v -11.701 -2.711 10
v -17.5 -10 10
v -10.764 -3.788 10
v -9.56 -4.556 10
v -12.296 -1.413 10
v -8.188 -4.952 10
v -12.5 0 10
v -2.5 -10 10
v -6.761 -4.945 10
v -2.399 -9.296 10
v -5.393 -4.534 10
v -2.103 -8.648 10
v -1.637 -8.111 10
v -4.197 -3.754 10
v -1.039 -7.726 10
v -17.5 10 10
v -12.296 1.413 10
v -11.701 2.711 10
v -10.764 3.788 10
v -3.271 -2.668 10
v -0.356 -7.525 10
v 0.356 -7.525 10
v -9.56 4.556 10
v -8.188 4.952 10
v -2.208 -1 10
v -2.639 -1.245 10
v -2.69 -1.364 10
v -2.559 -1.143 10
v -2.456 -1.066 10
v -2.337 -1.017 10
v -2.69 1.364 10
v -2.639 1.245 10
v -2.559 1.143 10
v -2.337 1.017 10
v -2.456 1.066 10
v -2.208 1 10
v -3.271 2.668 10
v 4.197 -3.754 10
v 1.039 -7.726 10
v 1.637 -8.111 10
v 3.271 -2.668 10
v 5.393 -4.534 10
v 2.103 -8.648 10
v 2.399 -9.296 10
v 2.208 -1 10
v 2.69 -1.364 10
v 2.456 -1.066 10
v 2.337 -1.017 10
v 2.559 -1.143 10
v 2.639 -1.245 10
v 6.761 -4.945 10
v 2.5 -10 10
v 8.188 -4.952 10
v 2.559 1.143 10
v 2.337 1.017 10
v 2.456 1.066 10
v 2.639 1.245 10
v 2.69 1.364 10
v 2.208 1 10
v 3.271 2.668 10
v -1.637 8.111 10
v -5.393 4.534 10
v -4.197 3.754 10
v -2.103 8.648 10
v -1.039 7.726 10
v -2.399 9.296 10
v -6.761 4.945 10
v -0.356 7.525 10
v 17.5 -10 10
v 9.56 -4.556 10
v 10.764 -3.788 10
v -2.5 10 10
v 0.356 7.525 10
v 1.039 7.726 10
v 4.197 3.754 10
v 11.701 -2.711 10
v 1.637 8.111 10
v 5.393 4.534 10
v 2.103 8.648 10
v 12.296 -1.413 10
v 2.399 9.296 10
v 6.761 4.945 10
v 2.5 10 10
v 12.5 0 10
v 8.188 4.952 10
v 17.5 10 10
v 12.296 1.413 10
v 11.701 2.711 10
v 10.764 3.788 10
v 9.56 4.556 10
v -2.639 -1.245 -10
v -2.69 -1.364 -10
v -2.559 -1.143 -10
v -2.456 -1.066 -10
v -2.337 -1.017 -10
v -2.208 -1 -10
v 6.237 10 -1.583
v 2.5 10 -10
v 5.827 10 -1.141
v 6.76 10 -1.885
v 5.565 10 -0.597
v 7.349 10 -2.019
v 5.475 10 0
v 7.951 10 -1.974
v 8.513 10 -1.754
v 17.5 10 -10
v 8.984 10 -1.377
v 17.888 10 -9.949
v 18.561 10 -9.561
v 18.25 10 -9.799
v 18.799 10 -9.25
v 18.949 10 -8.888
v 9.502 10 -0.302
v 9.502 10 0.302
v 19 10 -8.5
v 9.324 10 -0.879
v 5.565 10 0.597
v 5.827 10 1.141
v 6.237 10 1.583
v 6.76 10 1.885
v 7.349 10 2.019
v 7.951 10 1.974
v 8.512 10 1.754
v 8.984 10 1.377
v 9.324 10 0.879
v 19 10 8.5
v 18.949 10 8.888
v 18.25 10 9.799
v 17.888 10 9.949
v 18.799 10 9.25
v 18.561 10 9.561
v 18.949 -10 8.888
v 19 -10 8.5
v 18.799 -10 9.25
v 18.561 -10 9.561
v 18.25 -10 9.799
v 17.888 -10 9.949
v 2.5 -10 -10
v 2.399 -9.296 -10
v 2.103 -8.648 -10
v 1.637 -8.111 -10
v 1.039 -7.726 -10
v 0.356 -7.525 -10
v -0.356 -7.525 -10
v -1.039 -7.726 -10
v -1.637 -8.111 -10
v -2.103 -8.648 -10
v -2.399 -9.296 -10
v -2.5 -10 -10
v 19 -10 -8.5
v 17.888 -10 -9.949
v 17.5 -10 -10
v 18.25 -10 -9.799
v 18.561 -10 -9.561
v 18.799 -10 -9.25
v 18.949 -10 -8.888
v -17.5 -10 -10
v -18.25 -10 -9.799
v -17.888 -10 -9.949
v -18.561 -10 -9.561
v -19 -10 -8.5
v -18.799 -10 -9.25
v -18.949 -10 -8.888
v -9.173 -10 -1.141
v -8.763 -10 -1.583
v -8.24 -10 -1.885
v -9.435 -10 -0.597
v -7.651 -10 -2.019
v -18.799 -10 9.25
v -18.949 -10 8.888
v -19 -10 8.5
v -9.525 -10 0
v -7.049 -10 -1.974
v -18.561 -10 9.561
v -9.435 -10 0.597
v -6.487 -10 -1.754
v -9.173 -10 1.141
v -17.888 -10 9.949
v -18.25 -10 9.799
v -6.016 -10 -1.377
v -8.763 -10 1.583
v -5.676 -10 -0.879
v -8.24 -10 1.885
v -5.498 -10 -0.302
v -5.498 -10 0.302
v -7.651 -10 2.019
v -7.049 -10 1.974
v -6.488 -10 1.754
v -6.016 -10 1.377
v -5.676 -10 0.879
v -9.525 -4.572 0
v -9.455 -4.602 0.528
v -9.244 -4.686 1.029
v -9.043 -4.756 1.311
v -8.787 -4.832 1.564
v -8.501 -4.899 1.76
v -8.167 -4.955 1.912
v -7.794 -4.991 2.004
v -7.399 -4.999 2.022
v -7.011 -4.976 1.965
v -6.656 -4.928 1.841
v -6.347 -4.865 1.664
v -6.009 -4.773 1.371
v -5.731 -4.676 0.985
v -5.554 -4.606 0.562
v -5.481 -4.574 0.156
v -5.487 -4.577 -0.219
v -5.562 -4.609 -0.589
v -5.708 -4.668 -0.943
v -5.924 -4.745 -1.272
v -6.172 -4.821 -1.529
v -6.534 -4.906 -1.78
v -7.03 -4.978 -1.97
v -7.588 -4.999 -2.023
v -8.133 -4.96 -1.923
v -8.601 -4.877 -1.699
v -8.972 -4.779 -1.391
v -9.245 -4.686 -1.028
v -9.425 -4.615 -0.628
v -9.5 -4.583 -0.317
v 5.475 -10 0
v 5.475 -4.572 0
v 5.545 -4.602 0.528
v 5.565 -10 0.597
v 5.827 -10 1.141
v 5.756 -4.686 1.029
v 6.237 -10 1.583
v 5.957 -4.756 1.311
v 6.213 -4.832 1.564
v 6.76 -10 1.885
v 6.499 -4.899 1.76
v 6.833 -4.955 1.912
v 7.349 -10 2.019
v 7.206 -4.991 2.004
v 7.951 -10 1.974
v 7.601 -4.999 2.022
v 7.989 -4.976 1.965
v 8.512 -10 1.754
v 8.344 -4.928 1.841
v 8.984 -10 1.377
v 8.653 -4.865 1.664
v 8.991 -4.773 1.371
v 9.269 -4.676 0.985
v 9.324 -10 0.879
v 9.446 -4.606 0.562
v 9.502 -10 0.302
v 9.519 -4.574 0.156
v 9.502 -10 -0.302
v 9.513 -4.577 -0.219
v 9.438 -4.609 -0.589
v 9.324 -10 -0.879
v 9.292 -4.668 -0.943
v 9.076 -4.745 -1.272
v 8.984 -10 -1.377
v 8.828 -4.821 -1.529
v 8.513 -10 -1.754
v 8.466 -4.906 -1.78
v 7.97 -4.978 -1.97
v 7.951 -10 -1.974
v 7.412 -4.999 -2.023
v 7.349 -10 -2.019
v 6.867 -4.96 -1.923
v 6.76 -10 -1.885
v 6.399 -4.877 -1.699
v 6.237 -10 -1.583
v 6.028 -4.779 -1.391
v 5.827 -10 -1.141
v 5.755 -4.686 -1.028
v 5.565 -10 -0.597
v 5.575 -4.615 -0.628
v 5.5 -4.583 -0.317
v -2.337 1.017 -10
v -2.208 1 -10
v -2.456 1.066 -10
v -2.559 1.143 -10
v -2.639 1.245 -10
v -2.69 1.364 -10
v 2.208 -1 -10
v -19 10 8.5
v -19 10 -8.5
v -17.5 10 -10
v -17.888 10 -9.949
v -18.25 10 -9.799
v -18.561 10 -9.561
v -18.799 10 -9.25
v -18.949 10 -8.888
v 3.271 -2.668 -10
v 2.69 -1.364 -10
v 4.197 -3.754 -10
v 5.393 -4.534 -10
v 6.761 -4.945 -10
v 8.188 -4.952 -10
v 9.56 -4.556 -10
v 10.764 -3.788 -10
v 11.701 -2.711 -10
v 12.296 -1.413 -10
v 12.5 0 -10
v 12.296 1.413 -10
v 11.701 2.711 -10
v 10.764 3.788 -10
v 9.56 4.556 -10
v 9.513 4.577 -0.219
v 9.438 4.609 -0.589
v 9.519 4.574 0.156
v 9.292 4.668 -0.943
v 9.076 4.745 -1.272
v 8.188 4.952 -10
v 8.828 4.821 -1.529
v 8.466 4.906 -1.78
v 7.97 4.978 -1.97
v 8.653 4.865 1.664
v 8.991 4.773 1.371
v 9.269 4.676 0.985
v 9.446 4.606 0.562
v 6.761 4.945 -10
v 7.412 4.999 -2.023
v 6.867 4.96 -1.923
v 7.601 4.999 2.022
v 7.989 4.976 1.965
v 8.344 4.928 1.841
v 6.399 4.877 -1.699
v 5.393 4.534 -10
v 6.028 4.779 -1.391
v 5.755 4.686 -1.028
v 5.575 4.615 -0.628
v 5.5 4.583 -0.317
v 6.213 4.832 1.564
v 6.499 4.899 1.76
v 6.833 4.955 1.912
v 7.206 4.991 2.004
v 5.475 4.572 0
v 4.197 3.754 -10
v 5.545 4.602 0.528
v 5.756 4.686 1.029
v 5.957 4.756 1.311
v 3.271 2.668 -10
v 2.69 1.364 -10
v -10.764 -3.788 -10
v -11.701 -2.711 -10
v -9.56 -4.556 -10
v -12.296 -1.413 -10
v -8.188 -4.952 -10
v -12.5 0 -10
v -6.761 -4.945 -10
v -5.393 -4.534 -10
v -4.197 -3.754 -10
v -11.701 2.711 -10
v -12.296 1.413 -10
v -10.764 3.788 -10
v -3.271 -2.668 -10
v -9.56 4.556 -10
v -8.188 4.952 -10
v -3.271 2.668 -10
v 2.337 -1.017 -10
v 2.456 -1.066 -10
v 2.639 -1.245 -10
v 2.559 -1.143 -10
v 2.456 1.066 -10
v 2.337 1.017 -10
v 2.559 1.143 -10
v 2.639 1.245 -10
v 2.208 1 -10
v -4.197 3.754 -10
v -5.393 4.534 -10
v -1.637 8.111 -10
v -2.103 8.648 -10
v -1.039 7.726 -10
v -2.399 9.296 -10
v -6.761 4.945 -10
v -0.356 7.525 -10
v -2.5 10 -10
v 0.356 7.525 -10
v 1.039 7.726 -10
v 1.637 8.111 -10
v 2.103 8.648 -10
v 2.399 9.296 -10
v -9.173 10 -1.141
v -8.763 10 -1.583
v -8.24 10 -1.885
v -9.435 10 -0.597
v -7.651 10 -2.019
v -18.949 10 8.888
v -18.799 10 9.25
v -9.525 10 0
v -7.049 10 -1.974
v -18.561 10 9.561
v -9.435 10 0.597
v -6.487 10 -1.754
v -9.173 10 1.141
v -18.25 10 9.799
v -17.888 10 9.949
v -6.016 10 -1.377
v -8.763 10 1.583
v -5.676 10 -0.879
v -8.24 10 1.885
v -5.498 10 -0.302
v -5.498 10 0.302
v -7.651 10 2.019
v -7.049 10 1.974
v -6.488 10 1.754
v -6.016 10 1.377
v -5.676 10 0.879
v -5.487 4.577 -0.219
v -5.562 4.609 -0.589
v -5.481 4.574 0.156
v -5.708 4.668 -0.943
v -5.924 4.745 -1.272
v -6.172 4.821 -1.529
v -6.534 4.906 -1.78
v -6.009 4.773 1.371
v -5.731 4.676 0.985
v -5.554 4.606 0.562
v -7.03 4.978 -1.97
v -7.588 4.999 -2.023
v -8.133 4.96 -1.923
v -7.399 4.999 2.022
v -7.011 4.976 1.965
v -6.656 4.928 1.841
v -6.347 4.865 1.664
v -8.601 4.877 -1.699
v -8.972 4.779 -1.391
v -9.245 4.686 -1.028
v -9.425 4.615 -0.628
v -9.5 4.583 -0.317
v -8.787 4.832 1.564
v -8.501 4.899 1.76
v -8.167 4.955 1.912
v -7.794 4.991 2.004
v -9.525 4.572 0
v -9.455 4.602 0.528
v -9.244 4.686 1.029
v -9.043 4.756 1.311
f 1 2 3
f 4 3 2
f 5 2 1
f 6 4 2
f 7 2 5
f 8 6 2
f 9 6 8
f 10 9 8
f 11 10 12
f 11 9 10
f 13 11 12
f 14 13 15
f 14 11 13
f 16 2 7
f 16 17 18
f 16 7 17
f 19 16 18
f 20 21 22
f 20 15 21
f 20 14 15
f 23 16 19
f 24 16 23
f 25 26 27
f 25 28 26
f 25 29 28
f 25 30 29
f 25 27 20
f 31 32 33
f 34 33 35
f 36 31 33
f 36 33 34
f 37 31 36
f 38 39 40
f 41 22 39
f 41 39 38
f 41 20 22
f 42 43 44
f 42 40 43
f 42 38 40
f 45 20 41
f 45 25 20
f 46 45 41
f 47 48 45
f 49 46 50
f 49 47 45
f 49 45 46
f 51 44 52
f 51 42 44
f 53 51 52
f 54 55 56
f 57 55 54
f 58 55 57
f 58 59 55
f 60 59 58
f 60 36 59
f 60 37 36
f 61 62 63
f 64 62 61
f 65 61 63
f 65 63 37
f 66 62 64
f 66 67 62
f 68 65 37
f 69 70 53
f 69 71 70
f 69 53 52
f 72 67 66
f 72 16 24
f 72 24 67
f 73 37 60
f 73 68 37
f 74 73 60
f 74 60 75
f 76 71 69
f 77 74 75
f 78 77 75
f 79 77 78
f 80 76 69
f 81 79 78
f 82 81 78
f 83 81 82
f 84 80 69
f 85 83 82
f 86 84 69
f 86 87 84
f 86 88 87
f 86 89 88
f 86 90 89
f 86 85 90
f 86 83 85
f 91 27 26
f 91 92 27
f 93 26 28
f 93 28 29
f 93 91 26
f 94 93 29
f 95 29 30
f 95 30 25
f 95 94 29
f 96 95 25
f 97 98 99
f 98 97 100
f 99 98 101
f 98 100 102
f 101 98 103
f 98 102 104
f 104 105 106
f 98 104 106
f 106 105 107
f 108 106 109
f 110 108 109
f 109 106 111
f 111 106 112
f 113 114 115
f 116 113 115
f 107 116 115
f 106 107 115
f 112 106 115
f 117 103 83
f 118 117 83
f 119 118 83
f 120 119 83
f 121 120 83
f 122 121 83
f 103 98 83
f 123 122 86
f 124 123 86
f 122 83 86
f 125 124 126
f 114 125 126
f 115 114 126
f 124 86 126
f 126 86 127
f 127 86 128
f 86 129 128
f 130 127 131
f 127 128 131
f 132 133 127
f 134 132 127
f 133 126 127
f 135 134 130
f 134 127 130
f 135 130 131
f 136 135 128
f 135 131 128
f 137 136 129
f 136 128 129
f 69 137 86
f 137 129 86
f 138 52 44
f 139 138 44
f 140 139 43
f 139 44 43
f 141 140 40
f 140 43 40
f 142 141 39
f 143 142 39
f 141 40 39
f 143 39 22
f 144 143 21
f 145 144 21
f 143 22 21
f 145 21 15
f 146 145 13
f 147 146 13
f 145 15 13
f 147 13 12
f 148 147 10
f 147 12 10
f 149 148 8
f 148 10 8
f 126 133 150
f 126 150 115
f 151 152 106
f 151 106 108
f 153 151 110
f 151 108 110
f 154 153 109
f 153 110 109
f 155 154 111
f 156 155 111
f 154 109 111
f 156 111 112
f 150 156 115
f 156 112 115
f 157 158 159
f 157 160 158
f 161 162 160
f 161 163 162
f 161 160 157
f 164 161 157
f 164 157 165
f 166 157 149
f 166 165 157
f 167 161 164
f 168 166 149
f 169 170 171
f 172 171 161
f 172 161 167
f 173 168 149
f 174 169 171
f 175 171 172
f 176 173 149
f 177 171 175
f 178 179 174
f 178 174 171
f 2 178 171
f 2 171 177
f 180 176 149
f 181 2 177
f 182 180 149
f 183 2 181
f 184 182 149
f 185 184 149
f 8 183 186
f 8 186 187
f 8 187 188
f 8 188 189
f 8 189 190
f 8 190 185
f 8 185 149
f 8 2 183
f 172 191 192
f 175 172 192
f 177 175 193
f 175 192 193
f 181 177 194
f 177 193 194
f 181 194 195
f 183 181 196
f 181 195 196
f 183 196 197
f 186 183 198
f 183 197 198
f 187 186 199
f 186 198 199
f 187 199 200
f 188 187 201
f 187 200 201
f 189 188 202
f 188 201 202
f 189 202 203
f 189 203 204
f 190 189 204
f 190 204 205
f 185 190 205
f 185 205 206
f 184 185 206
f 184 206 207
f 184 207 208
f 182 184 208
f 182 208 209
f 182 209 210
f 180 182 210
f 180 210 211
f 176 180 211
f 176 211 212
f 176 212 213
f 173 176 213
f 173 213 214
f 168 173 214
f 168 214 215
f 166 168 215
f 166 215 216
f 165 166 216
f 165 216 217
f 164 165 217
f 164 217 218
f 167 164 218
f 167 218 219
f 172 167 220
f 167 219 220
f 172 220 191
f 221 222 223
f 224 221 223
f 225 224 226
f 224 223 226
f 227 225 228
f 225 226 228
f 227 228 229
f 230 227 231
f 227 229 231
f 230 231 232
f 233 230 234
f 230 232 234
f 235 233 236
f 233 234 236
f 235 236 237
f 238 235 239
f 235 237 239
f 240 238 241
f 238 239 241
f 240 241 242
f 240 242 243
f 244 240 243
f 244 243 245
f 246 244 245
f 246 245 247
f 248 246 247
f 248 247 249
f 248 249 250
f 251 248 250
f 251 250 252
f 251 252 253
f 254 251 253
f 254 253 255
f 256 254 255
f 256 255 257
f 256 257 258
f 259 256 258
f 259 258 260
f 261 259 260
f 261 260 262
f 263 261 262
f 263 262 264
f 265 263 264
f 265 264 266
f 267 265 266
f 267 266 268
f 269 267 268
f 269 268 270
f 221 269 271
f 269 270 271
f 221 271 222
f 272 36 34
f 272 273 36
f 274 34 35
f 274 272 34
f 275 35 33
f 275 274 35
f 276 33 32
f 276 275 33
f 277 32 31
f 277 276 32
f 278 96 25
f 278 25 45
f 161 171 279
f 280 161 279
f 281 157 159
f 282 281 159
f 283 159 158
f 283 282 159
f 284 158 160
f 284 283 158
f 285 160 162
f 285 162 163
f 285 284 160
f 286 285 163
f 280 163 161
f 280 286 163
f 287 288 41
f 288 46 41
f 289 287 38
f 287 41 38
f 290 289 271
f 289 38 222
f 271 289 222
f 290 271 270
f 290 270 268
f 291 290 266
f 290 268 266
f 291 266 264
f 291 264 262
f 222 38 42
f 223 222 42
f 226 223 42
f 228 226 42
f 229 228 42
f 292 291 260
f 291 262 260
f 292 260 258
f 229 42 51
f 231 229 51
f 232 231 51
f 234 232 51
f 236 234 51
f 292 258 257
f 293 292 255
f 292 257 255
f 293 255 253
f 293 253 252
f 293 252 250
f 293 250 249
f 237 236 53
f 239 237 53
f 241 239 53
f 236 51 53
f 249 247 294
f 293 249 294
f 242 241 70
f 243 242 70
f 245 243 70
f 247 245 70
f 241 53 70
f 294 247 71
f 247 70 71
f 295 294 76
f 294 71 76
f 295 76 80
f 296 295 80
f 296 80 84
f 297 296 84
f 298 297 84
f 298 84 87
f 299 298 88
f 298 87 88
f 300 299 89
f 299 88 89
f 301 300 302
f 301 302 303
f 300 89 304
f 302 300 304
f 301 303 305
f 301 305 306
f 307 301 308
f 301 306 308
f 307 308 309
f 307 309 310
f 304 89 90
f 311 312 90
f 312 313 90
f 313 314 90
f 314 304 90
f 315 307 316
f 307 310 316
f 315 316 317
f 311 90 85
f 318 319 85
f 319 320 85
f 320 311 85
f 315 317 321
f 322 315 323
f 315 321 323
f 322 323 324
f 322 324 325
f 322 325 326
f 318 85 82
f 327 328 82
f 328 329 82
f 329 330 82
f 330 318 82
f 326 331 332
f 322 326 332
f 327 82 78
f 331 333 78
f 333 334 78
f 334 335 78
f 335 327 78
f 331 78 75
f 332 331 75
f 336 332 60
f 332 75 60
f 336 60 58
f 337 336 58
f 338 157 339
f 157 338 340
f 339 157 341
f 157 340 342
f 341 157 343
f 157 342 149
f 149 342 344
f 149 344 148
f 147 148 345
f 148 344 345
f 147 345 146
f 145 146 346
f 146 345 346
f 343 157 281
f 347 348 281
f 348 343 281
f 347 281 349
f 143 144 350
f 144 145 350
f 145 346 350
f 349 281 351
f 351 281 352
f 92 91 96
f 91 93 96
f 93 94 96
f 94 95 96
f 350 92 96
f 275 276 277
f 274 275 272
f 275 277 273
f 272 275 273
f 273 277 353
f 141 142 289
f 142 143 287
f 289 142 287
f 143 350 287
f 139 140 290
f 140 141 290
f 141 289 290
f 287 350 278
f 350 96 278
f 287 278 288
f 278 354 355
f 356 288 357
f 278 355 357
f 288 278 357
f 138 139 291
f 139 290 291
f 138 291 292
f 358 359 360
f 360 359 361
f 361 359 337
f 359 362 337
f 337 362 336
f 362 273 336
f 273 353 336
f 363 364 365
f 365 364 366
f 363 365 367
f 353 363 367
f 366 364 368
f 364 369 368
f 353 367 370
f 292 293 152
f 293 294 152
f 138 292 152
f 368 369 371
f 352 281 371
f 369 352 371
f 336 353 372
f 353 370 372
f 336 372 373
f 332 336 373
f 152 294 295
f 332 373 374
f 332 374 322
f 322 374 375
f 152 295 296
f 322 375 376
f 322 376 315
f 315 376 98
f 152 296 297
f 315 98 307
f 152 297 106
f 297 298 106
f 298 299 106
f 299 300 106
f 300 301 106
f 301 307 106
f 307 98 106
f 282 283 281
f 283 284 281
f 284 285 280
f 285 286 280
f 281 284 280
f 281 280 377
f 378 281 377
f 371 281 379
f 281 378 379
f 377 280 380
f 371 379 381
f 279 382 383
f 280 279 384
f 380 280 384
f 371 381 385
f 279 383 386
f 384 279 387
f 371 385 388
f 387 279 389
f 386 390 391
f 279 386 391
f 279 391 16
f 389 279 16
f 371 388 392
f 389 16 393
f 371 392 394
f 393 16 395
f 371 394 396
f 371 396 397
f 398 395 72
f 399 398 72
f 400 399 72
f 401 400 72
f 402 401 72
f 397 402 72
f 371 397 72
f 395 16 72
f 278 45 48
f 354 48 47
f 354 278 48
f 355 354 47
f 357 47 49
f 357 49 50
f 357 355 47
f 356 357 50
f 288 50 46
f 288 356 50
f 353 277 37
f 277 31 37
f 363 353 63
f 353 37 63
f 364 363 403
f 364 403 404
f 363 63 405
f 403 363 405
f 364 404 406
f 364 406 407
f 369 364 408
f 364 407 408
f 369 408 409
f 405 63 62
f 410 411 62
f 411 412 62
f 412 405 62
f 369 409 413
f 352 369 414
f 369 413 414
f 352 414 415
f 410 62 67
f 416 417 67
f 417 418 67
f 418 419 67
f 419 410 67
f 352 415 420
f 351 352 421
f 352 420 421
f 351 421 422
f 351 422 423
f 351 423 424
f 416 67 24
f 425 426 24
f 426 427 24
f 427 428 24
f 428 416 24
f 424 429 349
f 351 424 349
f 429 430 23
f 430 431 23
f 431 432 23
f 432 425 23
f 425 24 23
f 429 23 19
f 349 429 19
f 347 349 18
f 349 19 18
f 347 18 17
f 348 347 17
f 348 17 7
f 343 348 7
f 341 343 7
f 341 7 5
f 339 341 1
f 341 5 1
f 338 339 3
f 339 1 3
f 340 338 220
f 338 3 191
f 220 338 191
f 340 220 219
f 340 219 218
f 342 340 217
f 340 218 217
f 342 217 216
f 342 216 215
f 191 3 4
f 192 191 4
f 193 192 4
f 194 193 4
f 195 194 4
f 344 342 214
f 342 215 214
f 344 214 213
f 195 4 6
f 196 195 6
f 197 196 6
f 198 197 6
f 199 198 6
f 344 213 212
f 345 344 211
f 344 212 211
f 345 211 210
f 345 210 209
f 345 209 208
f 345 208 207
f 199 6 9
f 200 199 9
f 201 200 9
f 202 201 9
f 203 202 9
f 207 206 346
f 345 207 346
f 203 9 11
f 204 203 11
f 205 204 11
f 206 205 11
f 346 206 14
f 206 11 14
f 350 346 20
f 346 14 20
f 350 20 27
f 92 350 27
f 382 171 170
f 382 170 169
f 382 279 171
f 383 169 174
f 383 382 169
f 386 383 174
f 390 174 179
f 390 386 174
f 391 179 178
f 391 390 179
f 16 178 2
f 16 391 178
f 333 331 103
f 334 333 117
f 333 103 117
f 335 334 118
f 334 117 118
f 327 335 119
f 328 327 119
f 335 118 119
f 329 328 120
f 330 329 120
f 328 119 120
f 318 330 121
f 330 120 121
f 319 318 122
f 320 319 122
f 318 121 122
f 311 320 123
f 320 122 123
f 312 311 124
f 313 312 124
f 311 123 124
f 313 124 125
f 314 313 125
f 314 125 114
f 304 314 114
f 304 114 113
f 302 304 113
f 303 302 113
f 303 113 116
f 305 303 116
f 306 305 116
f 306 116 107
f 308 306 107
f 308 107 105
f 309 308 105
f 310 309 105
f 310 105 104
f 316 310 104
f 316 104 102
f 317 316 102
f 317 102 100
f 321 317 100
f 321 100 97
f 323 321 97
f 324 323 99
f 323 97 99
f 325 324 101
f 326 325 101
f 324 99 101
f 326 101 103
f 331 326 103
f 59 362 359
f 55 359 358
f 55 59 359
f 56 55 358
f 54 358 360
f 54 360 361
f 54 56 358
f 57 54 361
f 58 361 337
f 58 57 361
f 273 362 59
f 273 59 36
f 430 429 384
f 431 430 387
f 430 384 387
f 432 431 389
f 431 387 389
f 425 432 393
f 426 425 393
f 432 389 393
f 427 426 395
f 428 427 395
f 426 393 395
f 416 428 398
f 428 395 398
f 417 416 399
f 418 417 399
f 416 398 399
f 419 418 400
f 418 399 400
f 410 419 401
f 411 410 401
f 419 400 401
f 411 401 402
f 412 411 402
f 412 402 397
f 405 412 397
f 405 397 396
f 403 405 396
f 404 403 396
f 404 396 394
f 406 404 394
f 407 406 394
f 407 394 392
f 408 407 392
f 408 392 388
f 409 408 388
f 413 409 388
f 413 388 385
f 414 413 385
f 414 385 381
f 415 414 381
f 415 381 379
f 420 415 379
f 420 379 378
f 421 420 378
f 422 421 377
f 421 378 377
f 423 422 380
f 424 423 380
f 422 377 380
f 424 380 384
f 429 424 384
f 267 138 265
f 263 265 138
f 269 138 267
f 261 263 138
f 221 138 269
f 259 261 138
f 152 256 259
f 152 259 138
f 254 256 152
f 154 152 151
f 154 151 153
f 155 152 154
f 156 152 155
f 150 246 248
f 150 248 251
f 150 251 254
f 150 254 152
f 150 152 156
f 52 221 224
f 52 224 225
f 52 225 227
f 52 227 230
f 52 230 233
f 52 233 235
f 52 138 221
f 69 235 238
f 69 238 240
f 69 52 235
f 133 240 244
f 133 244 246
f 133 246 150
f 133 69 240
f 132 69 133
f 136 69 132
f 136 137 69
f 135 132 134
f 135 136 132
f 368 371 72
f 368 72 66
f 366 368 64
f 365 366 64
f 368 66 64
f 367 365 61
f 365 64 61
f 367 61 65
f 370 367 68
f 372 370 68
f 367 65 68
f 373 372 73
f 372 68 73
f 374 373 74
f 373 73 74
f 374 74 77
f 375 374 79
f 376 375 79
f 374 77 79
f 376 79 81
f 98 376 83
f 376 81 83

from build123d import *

# Parameters (mm, degrees)
SKETCH_1_W          = 38
SKETCH_1_H          = 20
EXTRUDE_1_DEPTH     = 10
SKETCH_2_R          = 2.025
CUT_EXTRUDE_1_DEPTH = 30.342801502
FILLET_1_R          = 0.5
SKETCH_3_R          = 2.5
CUT_EXTRUDE_2_DEPTH = 30.342801604
FILLET_2_R          = 1.5


with BuildPart() as part:
    # 草图1 → 凸台-拉伸1 (new, symmetric)
    with BuildSketch(Plane.XY):
        Rectangle(SKETCH_1_W, SKETCH_1_H)
        with BuildLine():
            Line((2.601020514, 1), (-2.601020514, 1))
            ThreePointArc((-2.601020514, 1), (-12.5, 0), (-2.601020514, -1))
            Line((-2.601020514, -1), (2.601020514, -1))
            ThreePointArc((2.601020514, -1), (12.5, 0), (2.601020514, 1))
        make_face(mode=Mode.SUBTRACT)
    extrude(amount=EXTRUDE_1_DEPTH, both=True)

    # 草图2 → 切除-拉伸1 (cut, through all)
    with BuildSketch(Plane(origin=(0, 10, 0), x_dir=(1, 0, 0), z_dir=(0, 1, 0))):
        with Locations(Location((-7.5, 0, 0), (0, 0, 180))):
            Circle(SKETCH_2_R)
        with Locations(Location((7.5, 0, 0), (0, 0, 180))):
            Circle(SKETCH_2_R)
    extrude(amount=-CUT_EXTRUDE_1_DEPTH, mode=Mode.SUBTRACT)

    # 圆角1
    fillet_1_edges = [part.edges().sort_by_distance(p)[0] for p in [
        (2.601020514, -1, 0),
        (2.601020514, 1, 0),
        (-2.601020514, 1, 0),
        (-2.601020514, -1, 0),
    ]]
    fillet(fillet_1_edges, radius=FILLET_1_R)

    # 草图3 → 切除-拉伸2 (cut, through all)
    with BuildSketch(Plane.XY.offset(10)):
        with Locations((0, 10)):
            Circle(SKETCH_3_R)
        with Locations((0, -10)):
            Circle(SKETCH_3_R)
    extrude(amount=-CUT_EXTRUDE_2_DEPTH, mode=Mode.SUBTRACT)

    # 圆角2
    fillet_2_edges = [part.edges().sort_by_distance(p)[0] for p in [
        (19, 0, 10),
        (-19, 0, 10),
        (19, 0, -10),
        (-19, 0, -10),
    ]]
    fillet(fillet_2_edges, radius=FILLET_2_R)


solid = part.part
